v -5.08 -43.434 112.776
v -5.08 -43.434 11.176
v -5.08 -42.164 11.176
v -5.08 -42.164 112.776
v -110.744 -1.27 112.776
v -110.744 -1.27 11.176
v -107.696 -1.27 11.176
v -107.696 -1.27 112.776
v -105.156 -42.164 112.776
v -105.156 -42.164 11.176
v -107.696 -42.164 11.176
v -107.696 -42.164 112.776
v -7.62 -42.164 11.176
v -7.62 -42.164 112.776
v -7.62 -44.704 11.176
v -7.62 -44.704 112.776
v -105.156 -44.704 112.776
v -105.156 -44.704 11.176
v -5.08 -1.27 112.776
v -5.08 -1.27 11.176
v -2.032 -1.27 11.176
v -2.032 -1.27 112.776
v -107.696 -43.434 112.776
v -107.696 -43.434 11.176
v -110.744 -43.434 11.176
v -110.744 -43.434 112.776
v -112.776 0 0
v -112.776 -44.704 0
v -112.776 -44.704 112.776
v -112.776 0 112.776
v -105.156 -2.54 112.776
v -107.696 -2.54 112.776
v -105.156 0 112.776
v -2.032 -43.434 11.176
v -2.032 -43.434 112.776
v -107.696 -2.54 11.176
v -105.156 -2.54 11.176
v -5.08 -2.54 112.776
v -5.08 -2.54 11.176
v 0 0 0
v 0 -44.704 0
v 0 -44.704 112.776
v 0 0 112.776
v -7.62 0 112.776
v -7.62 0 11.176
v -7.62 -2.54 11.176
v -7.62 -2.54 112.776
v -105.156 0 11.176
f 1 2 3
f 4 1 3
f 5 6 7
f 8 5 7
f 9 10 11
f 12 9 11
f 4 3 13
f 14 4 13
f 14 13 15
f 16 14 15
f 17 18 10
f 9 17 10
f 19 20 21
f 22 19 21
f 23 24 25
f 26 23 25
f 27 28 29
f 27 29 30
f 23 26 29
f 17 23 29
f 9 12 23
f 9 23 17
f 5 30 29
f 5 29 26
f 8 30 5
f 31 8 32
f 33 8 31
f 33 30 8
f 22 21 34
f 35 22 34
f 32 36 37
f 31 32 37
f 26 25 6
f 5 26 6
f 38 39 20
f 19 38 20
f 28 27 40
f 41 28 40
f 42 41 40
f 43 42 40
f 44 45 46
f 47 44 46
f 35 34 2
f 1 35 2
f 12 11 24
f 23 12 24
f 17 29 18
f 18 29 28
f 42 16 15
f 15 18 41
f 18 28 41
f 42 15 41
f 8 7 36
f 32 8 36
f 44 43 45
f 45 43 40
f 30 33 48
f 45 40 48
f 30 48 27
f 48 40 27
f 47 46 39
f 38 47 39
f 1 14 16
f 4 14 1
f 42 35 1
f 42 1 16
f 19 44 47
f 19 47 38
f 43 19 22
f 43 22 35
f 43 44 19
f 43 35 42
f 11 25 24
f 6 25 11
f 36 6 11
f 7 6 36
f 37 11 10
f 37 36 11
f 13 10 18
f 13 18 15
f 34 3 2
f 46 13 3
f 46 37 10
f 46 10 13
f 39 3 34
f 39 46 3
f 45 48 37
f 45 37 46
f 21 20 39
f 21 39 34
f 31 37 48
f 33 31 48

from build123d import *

# Parameters (mm, degrees)
F0_W     = 112.776
F0_H     = 44.704
F1_DEPTH = 11.176
F3_DEPTH = 101.6


with BuildPart() as f1:
    # F0 (on Top) → F1 (new body)
    with BuildSketch(Plane.XY):
        with Locations((-56.388, -22.352)):
            Rectangle(F0_W, F0_H)
    extrude(amount=F1_DEPTH)

    # F2 (on face) → F3 (join)
    with BuildSketch(Plane.XY.offset(11.176)):
        Polygon((0, -44.704), (0, -22.352), (0, 0), (-7.62, 0), (-7.62, -2.54), (-5.08, -2.54), (-5.08, -1.27), (-2.032, -1.27), (-2.032, -22.352), (-2.032, -43.434), (-5.08, -43.434), (-5.08, -42.164), (-7.62, -42.164), (-7.62, -44.704), align=None)
        Polygon((-105.156, -2.54), (-105.156, 0), (-112.776, 0), (-112.776, -22.352), (-112.776, -44.704), (-105.156, -44.704), (-105.156, -42.164), (-107.696, -42.164), (-107.696, -43.434), (-110.744, -43.434), (-110.744, -22.352), (-110.744, -1.27), (-107.696, -1.27), (-107.696, -2.54), align=None)
    extrude(amount=F3_DEPTH)


solid = f1.part
